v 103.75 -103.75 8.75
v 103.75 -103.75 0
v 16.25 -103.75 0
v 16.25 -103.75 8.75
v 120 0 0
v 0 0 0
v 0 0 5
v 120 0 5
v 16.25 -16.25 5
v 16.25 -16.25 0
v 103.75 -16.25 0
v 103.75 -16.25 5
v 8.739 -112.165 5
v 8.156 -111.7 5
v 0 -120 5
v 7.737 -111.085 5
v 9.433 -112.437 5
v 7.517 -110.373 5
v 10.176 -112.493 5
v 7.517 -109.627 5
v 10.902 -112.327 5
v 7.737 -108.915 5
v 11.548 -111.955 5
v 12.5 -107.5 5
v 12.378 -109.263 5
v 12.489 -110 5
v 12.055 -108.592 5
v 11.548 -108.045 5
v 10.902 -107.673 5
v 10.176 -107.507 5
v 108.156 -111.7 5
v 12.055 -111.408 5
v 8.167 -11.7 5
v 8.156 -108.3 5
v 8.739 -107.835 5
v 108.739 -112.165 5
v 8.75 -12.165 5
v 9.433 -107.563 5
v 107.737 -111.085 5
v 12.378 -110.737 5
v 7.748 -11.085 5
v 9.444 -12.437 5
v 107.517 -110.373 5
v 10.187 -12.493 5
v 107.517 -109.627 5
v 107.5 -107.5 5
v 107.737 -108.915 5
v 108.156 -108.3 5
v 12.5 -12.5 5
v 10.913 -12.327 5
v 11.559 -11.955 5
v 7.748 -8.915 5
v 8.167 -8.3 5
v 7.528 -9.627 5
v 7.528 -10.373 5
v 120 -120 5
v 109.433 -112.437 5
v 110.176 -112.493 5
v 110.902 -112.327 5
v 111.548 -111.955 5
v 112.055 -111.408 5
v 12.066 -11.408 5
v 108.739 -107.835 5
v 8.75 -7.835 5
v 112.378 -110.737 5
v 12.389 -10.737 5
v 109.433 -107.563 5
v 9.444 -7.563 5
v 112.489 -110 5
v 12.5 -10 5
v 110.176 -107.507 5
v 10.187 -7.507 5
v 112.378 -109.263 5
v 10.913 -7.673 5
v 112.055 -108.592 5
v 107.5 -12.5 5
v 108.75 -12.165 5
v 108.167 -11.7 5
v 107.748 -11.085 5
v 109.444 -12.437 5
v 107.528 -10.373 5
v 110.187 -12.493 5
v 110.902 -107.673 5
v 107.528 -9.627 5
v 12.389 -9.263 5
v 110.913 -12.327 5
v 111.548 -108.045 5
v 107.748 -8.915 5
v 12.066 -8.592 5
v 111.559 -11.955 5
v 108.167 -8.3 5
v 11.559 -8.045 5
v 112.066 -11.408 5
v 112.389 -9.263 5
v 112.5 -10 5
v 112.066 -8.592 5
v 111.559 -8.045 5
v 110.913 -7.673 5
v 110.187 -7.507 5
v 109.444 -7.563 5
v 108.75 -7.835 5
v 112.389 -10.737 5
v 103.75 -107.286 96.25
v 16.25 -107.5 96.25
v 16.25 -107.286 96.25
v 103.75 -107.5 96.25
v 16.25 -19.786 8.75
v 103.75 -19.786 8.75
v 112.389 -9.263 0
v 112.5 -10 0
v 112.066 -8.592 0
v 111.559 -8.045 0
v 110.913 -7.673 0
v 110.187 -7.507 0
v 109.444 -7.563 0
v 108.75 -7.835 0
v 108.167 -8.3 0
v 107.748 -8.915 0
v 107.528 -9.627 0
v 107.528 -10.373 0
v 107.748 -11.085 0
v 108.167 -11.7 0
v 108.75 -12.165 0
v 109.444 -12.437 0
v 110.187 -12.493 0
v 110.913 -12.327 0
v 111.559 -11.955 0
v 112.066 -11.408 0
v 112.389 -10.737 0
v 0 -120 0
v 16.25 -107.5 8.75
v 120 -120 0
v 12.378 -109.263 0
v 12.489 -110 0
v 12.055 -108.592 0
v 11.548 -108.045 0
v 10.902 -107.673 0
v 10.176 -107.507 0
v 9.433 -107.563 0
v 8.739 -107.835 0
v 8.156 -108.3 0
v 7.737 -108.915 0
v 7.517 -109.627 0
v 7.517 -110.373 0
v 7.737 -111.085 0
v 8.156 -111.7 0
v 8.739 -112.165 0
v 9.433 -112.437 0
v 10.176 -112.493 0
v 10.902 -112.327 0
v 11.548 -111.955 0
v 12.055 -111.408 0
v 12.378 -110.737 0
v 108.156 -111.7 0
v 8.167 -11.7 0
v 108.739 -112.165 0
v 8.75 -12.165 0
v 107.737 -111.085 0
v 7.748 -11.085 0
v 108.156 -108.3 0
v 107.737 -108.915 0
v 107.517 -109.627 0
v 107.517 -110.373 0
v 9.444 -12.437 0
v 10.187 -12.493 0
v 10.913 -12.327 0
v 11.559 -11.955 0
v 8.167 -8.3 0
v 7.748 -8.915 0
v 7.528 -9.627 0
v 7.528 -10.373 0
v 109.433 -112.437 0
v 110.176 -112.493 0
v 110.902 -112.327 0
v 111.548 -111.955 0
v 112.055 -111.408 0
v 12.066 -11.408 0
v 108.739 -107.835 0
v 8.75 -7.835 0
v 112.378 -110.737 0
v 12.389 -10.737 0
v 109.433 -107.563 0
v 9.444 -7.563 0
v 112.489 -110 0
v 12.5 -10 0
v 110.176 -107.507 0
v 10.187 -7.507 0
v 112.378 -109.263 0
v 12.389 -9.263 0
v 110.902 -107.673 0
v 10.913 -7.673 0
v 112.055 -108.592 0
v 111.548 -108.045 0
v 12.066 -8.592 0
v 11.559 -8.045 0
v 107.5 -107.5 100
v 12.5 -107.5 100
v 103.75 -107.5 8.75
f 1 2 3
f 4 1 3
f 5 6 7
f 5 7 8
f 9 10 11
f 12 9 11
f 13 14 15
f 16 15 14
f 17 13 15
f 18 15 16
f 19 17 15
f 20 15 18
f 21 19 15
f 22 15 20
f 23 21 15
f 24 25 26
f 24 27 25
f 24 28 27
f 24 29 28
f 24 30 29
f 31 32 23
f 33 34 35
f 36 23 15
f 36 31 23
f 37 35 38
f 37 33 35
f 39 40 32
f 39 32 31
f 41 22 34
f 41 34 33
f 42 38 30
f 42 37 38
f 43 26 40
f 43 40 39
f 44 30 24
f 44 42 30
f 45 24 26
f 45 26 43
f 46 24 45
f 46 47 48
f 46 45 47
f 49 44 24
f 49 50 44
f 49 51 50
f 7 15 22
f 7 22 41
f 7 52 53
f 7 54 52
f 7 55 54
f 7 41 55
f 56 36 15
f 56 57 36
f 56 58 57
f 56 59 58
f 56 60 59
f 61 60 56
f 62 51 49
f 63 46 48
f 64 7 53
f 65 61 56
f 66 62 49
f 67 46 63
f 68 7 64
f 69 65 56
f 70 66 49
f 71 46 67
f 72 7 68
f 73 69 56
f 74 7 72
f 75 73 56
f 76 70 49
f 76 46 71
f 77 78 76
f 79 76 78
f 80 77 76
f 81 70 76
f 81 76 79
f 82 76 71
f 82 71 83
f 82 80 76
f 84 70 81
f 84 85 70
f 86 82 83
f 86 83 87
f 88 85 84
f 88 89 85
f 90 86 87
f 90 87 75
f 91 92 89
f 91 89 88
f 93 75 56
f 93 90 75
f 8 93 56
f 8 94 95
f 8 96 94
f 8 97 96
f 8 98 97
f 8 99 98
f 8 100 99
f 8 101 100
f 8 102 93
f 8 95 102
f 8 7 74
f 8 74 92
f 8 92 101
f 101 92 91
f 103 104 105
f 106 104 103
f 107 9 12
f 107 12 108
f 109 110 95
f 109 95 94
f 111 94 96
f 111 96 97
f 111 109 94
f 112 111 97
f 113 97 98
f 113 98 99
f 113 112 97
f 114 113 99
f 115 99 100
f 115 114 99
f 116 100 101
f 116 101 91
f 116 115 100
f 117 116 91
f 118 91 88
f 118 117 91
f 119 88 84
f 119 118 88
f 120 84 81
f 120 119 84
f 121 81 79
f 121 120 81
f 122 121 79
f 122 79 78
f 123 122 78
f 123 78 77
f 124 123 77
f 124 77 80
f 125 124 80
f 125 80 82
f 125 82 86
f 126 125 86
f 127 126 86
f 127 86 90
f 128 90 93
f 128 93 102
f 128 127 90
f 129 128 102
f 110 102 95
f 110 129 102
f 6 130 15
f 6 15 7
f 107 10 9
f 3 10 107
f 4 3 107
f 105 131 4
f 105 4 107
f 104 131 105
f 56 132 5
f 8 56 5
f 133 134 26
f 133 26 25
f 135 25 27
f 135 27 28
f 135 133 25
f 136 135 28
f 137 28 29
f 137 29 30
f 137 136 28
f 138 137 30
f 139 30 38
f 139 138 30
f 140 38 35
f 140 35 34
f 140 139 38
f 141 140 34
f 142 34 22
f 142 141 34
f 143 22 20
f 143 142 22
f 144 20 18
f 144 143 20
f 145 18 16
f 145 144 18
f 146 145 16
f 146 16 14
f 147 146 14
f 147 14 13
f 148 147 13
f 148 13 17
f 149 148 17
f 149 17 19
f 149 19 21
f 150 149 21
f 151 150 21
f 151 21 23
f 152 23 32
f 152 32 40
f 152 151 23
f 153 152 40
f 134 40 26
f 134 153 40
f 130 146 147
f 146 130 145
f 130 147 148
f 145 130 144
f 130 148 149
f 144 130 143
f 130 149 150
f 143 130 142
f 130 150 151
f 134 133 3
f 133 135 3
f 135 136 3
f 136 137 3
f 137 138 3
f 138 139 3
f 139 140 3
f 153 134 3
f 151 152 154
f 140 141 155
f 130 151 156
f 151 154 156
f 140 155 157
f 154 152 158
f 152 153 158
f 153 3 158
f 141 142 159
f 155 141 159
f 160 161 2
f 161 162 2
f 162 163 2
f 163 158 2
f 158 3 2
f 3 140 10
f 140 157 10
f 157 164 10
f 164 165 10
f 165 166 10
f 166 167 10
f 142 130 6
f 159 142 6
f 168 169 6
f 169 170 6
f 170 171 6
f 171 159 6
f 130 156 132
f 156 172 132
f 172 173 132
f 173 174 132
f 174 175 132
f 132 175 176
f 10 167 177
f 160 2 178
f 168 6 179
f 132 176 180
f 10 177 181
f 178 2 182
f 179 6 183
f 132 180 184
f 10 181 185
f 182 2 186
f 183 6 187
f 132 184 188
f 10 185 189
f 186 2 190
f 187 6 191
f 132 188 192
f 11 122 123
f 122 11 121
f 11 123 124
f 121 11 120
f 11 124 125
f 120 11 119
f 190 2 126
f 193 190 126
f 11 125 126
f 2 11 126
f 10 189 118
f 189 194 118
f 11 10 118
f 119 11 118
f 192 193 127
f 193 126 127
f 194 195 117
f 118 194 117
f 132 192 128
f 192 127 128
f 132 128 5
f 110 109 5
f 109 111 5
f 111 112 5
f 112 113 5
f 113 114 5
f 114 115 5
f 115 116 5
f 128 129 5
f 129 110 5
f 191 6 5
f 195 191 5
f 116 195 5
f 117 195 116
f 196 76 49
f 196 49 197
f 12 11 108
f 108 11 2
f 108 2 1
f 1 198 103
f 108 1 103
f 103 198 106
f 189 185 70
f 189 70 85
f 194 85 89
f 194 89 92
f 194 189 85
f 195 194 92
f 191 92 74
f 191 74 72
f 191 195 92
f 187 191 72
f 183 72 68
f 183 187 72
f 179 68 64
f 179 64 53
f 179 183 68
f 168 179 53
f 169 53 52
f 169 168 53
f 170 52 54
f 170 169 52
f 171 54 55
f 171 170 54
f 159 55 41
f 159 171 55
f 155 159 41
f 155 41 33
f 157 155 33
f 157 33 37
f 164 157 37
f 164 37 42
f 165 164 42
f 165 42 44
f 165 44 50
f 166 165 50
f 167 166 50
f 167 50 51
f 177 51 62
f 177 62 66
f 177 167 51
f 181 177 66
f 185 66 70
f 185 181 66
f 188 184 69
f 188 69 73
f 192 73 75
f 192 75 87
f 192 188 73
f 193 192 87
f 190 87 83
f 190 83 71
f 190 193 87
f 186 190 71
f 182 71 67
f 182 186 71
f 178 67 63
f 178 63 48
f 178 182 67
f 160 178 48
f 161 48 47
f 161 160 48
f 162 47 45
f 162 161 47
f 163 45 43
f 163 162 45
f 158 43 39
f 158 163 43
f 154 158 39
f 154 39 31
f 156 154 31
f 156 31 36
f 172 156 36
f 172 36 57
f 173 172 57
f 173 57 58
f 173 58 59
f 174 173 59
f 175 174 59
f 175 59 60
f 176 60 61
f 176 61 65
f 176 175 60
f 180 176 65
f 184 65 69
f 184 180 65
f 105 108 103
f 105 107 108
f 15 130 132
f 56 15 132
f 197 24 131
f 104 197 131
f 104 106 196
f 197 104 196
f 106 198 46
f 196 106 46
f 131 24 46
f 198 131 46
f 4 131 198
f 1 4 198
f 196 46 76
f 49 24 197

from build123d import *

# Parameters (mm, degrees)
SKETCH2_W           = 120
SKETCH2_H           = 120
SKETCH2_R           = 2.5
SKETCH2_W_2         = 87.5
SKETCH2_H_2         = 87.5
BOSS_EXTRUDE1_DEPTH = 5
SKETCH3_W           = 95
SKETCH3_H           = 95
BOSS_EXTRUDE2_DEPTH = 95
CUT_EXTRUDE1_DEPTH  = 95
CUT_EXTRUDE4_REACH  = 191.621
SKETCH5_W           = 87.5
SKETCH5_H           = 87.5
CUT_EXTRUDE5_REACH  = 196.487
SKETCH9_W           = 87.5
SKETCH9_H           = 83.964466094
CUT_EXTRUDE7_DEPTH  = 87.5


with BuildPart() as part:
    # Sketch2 → Boss-Extrude1 (new body)
    with BuildSketch(Plane.XY):
        with Locations((60, -60)):
            Rectangle(SKETCH2_W, SKETCH2_H)
        with Locations((10, -10.00000061)):
            Circle(SKETCH2_R, mode=Mode.SUBTRACT)
        with Locations((110, -10)):
            Circle(SKETCH2_R, mode=Mode.SUBTRACT)
        with Locations((9.988952602, -110)):
            Circle(SKETCH2_R, mode=Mode.SUBTRACT)
        with Locations((109.988952602, -110)):
            Circle(SKETCH2_R, mode=Mode.SUBTRACT)
        with Locations((60, -60)):
            Rectangle(SKETCH2_W_2, SKETCH2_H_2, mode=Mode.SUBTRACT)
    extrude(amount=BOSS_EXTRUDE1_DEPTH)

    # Sketch3 → Boss-Extrude2 (add)
    with BuildSketch(Plane.XY.offset(5)):
        with Locations((60, -60)):
            Rectangle(SKETCH3_W, SKETCH3_H)
    extrude(amount=BOSS_EXTRUDE2_DEPTH)

    # Sketch4 → Cut-Extrude1 (cut)
    with BuildSketch(Plane(origin=(107.5, 0, 0), x_dir=(0, 0, -1), z_dir=(1, 0, 0))):
        Polygon((-5, -12.5), (-100, -107.5), (-100, -12.5), align=None)
    extrude(amount=-CUT_EXTRUDE1_DEPTH, mode=Mode.SUBTRACT)

    # Cut-Extrude4: up to this plane
    cut_extrude4_end = Plane(origin=(12.5, -14.267766953, 3.232233047), z_dir=(0, -0.7071067811865476, -0.7071067811865476))
    # Sketch5 → Cut-Extrude4 (cut, up to the surface)
    with BuildSketch(Plane.XZ.offset(107.5), mode=Mode.PRIVATE) as cut_extrude4_sk1:
        with Locations((60, 52.5)):
            Rectangle(SKETCH5_W, SKETCH5_H)
    cut_extrude4_tool1 = split(extrude(cut_extrude4_sk1.sketch, amount=-CUT_EXTRUDE4_REACH, mode=Mode.PRIVATE), bisect_by=cut_extrude4_end, keep=Keep.BOTH, mode=Mode.PRIVATE)
    add(cut_extrude4_tool1.solids().sort_by_distance((60, -107.5, 52.5))[0], mode=Mode.SUBTRACT)

    # Cut-Extrude5: up to this plane
    cut_extrude5_end = Plane(origin=(12.5, -14.267766953, 3.232233047), z_dir=(0, -0.7071067811865476, -0.7071067811865476))
    # Sketch9 → Cut-Extrude5 (cut, up to the surface)
    with BuildSketch(Plane(origin=(0, 0, 5), x_dir=(-1, 0, 0), z_dir=(0, 0, -1)), mode=Mode.PRIVATE) as cut_extrude5_sk1:
        with Locations((-60, -61.767766953)):
            Rectangle(SKETCH9_W, SKETCH9_H)
    cut_extrude5_tool1 = split(extrude(cut_extrude5_sk1.sketch, amount=-CUT_EXTRUDE5_REACH, mode=Mode.PRIVATE), bisect_by=cut_extrude5_end, keep=Keep.BOTH, mode=Mode.PRIVATE)
    add(cut_extrude5_tool1.solids().sort_by_distance((60, -61.767767, 5))[0], mode=Mode.SUBTRACT)

    # Sketch10 → Cut-Extrude7 (cut)
    with BuildSketch(Plane.ZY.offset(-103.75)):
        Polygon((8.75, -19.785533906), (5, -19.785533906), (5, -16.25), align=None)
    extrude(amount=CUT_EXTRUDE7_DEPTH, mode=Mode.SUBTRACT)


solid = part.part
